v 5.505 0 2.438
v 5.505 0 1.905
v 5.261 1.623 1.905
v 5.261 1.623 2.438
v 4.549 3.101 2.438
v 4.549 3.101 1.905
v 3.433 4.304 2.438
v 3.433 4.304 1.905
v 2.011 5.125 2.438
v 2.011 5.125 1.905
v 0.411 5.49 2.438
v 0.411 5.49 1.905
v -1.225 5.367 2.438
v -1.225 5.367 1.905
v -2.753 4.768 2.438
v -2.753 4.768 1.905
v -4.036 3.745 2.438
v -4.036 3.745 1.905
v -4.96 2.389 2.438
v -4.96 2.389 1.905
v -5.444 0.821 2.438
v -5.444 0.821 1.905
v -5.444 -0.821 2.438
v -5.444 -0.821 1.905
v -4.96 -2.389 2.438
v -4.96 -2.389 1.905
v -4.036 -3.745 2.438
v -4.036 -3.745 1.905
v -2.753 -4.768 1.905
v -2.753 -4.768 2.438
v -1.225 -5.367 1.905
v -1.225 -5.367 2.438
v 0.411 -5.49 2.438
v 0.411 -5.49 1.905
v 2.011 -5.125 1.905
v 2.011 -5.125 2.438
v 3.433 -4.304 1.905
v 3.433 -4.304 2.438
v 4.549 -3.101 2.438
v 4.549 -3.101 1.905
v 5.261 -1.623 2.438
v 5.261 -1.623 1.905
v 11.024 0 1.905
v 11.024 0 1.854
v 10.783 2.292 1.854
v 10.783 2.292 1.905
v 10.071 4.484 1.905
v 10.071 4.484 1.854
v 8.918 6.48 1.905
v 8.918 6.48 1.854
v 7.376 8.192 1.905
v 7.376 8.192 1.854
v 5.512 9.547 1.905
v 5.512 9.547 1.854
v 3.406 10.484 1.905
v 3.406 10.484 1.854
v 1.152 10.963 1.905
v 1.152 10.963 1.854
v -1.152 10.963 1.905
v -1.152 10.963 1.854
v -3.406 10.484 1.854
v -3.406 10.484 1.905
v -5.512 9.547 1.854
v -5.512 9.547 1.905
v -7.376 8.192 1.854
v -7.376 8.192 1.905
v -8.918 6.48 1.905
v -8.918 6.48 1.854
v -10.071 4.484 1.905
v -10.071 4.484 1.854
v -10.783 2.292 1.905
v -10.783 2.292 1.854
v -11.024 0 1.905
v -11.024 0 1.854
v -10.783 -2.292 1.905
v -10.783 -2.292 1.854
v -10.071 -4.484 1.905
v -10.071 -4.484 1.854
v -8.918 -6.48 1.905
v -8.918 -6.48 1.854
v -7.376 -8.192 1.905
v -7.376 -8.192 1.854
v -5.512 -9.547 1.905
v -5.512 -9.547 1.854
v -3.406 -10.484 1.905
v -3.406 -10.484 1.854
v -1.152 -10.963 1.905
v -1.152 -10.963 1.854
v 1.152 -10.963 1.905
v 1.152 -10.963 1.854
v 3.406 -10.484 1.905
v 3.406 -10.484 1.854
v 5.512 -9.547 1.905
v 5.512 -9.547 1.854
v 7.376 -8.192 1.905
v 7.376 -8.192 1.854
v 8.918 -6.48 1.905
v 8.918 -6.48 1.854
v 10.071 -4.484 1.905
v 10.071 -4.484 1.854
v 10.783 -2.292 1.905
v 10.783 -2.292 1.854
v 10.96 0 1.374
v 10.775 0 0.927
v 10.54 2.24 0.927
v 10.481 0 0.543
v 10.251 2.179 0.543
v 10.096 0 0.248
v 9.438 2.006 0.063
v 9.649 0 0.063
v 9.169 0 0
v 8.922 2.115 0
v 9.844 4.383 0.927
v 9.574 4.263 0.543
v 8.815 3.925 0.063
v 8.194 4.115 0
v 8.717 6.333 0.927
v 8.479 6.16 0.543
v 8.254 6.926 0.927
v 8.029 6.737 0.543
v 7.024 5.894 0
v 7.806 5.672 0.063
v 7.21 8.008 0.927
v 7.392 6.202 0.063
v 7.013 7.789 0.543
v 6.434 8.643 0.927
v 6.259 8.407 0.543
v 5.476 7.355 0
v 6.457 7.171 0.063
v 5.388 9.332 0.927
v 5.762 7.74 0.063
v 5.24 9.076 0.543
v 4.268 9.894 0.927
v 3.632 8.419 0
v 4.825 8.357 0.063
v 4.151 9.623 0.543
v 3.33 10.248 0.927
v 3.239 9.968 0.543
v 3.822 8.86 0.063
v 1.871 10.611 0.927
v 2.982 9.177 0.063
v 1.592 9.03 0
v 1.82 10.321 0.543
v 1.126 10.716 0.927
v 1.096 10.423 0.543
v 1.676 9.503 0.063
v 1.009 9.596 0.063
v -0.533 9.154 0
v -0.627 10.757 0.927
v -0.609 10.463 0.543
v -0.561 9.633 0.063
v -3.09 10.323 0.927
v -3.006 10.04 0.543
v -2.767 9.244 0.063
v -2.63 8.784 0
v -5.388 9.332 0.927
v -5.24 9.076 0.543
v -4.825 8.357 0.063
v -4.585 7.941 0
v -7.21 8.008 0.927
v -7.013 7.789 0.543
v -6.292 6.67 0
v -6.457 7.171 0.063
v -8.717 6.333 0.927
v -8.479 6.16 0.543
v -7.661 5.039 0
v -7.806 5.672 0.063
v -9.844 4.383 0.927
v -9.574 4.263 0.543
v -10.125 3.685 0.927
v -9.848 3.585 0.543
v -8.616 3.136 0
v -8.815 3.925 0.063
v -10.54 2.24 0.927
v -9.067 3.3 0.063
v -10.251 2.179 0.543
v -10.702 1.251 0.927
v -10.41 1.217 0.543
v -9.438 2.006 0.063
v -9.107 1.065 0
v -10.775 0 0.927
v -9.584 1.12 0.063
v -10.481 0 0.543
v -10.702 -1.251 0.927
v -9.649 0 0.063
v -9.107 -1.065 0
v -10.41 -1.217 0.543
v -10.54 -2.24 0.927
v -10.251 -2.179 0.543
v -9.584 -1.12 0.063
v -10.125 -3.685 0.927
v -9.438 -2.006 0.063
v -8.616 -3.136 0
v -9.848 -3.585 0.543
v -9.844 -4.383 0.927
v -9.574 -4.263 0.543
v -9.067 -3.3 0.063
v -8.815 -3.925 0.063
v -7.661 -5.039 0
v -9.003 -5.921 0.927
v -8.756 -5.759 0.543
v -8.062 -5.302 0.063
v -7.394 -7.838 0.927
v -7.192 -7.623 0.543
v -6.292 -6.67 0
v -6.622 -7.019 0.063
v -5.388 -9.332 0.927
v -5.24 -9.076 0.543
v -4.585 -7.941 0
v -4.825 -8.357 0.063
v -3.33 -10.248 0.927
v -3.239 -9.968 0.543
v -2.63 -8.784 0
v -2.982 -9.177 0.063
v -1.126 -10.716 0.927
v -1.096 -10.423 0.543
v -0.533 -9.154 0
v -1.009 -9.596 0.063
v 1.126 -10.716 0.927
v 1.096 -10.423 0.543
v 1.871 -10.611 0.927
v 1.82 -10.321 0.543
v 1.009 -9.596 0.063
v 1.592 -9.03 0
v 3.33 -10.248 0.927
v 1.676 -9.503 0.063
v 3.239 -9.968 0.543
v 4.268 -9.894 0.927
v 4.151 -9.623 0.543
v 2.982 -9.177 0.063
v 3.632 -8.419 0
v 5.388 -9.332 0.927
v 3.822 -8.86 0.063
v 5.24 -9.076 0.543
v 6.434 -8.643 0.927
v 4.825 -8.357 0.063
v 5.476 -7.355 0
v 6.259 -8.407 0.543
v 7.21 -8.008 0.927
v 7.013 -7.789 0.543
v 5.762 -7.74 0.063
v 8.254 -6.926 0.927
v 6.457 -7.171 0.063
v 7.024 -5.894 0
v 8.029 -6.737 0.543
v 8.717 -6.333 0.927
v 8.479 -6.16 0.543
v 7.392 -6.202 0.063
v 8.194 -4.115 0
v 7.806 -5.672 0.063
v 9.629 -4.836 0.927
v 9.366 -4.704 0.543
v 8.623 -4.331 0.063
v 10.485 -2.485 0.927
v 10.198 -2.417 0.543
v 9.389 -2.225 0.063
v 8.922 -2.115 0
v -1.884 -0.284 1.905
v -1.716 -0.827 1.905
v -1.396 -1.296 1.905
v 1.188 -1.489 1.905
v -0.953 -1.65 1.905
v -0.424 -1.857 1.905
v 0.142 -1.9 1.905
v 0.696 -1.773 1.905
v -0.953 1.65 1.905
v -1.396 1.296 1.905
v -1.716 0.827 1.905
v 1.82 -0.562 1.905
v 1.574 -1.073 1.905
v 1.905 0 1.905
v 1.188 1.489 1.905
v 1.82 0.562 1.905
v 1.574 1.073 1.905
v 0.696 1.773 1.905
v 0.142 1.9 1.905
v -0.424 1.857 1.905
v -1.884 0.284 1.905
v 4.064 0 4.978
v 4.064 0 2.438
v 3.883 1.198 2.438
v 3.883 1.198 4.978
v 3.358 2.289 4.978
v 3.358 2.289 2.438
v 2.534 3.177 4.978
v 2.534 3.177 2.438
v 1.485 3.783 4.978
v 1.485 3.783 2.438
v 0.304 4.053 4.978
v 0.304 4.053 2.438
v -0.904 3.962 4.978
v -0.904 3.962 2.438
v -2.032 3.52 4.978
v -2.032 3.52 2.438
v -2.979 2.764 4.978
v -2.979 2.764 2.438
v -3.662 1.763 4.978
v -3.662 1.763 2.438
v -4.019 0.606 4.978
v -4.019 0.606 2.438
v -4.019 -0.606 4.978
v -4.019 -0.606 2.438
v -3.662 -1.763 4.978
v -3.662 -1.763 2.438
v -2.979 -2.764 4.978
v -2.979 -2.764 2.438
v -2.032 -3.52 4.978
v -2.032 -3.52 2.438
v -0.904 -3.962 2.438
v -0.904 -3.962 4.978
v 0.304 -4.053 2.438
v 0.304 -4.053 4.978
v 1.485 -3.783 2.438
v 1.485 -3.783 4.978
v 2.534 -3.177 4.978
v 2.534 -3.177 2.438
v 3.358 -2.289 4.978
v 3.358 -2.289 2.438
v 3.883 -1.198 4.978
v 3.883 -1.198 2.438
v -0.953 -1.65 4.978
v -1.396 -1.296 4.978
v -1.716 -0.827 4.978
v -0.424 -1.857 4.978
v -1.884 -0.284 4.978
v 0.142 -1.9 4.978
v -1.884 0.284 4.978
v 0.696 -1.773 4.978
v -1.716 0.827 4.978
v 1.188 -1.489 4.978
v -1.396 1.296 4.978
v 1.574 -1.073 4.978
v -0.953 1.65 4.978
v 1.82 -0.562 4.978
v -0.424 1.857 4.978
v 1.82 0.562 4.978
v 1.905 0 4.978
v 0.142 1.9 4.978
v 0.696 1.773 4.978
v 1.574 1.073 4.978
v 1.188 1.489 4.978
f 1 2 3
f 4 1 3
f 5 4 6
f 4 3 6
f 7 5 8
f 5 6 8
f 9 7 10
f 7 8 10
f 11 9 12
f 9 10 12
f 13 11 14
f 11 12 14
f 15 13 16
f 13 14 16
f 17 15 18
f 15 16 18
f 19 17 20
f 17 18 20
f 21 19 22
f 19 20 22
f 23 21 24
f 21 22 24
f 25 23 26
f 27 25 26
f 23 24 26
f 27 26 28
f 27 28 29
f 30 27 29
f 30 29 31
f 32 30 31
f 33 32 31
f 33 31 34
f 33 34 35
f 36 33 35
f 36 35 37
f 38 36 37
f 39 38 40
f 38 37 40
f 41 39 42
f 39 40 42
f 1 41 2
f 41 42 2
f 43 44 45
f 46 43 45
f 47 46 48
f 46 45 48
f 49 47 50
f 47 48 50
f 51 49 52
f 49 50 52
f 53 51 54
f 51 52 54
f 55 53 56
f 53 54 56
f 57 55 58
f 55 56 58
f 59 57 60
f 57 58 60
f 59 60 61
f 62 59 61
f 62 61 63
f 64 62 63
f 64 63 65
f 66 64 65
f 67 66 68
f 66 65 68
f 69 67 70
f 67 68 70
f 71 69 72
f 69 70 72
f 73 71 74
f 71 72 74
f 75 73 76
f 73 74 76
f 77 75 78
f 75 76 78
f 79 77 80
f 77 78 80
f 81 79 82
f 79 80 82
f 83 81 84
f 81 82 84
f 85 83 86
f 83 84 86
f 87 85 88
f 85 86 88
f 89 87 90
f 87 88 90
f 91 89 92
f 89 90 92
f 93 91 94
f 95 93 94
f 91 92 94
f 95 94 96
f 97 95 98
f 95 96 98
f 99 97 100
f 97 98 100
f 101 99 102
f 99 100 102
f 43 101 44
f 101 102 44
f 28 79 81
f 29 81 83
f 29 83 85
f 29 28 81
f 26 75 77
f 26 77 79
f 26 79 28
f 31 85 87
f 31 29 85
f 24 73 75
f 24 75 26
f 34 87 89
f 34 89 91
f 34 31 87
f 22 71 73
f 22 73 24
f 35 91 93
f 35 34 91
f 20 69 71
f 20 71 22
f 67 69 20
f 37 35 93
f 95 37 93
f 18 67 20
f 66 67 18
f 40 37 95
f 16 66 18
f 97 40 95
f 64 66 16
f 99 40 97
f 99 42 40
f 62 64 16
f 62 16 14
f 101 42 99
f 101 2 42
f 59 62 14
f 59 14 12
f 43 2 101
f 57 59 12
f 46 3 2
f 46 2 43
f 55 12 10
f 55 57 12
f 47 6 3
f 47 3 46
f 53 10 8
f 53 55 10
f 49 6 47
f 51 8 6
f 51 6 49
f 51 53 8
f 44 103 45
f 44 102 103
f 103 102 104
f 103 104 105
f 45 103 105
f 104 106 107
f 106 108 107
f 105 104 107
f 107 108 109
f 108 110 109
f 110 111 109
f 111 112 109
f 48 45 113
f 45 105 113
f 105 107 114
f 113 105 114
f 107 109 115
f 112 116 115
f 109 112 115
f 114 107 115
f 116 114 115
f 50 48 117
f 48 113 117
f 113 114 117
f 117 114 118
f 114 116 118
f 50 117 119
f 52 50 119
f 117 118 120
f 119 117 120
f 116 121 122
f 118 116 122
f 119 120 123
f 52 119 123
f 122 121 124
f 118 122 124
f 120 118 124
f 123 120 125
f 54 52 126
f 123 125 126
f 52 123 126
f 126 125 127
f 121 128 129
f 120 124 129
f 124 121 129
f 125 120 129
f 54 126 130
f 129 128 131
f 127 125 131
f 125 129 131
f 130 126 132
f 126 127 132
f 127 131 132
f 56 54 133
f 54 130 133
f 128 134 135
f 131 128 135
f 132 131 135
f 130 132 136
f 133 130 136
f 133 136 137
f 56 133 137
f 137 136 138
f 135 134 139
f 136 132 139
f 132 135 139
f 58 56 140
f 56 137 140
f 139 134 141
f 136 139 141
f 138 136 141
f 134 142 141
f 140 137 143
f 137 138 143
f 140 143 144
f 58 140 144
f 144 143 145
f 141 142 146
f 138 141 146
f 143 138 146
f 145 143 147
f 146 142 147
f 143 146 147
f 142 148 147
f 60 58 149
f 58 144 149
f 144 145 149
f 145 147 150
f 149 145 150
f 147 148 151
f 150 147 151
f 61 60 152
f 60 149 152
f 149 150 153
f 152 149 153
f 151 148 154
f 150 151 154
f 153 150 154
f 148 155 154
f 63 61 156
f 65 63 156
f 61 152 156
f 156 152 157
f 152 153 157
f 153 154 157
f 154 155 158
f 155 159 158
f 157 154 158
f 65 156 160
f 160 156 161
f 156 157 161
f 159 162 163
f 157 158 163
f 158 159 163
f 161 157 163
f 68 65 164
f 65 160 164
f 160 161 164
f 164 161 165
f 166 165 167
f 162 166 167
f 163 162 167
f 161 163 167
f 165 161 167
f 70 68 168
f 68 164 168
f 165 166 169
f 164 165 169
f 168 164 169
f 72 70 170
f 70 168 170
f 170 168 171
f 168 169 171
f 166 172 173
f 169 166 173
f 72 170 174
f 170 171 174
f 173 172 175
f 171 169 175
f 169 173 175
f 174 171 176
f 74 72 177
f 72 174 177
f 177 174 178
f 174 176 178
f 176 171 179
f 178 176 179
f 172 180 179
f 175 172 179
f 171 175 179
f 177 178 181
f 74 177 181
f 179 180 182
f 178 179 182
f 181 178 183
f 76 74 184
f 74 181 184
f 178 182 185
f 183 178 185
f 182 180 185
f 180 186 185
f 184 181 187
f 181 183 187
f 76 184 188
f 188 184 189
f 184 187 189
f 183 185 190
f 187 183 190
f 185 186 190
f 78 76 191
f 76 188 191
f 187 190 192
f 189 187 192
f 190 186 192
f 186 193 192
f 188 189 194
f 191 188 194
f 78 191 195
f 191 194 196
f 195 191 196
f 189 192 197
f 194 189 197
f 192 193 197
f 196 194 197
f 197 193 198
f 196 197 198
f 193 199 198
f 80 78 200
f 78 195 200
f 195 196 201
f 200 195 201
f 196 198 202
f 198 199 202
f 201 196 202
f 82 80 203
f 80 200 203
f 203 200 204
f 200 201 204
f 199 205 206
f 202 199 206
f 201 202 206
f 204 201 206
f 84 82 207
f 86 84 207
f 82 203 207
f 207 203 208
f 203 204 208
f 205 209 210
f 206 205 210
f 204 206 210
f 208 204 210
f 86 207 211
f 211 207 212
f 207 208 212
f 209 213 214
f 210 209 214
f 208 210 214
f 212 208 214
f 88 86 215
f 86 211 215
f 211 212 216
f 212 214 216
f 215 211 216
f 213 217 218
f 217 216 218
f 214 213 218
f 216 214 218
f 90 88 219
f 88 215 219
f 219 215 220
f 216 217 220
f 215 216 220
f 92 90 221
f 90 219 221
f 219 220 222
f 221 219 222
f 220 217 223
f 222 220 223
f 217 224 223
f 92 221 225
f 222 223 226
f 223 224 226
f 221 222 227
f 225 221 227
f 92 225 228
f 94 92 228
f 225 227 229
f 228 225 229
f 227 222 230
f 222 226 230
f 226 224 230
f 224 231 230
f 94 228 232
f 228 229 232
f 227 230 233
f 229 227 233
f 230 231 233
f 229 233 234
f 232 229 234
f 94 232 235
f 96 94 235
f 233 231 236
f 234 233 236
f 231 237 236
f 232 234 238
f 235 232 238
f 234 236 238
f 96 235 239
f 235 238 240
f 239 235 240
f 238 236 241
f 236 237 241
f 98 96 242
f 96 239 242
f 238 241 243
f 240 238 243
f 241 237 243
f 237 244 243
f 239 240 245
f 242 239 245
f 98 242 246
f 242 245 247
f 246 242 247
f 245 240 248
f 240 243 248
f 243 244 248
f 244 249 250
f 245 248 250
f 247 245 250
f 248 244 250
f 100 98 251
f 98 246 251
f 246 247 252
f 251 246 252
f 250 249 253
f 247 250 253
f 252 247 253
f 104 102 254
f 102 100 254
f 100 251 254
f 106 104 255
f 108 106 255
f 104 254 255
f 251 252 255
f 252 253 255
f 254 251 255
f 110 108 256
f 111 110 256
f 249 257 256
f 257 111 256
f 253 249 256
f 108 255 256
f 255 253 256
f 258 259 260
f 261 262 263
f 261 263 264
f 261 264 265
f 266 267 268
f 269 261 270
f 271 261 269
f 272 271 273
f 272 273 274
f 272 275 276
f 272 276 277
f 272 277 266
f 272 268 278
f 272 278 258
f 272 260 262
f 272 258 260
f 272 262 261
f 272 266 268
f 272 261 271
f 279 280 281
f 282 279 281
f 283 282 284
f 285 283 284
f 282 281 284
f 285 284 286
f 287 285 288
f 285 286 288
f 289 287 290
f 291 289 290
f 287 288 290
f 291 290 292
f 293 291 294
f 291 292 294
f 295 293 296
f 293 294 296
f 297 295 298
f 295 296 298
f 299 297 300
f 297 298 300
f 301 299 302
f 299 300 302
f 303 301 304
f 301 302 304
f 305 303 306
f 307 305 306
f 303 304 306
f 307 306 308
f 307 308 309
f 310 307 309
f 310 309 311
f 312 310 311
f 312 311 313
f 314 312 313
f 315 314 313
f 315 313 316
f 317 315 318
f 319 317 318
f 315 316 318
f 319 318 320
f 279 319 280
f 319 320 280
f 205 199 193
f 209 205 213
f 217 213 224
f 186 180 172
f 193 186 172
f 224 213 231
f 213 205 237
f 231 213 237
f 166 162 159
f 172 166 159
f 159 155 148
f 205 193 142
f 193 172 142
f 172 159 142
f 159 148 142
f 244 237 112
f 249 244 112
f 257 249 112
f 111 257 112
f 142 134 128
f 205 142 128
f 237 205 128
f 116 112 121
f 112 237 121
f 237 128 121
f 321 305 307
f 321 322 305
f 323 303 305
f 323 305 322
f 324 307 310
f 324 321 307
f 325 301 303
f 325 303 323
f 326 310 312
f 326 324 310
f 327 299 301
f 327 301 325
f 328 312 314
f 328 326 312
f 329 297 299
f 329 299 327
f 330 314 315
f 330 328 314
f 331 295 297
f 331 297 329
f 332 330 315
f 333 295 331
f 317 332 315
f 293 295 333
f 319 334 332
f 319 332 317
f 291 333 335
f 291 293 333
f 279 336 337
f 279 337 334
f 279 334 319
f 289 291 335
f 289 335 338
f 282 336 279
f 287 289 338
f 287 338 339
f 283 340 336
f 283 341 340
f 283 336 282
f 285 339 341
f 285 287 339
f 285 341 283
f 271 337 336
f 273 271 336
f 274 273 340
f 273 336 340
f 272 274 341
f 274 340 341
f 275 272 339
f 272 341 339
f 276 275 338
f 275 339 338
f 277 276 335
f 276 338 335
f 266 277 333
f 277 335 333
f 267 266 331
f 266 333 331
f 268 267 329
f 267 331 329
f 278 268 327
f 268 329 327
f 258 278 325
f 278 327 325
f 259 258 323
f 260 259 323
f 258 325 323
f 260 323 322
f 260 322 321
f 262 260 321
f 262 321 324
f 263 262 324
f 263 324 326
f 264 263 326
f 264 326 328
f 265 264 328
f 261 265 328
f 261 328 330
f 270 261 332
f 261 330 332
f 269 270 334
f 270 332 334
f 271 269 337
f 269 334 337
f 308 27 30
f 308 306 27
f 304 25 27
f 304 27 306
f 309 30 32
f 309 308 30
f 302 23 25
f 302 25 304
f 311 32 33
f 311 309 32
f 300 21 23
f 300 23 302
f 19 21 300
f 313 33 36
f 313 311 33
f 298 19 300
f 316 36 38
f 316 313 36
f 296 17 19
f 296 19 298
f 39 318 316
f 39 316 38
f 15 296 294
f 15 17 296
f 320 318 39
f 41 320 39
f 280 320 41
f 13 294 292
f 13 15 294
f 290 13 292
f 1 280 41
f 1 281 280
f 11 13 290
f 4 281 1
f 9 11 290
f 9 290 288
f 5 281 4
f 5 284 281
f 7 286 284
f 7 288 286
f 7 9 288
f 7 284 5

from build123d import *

# Parameters (mm, degrees)
F0_R     = 11.0236
F1_DEPTH = 1.905
F2_R     = 5.50545
F3_DEPTH = 0.5334
F4_R     = 4.064
F5_DEPTH = 2.54
F6_R     = 1.905
F7_DEPTH = 3.0734
F8_R     = 1.8542


with BuildPart() as f1:
    # F0 (on Top) → F1 (new body)
    with BuildSketch(Plane.XY):
        Circle(F0_R)
    extrude(amount=F1_DEPTH)

    # F2 (on face) → F3 (join)
    with BuildSketch(Plane.XY.offset(1.905)):
        Circle(F2_R)
    extrude(amount=F3_DEPTH)

    # F4 (on face) → F5 (join)
    with BuildSketch(Plane.XY.offset(2.4384)):
        Circle(F4_R)
    extrude(amount=F5_DEPTH)

    # F6 (on face) → F7 (cut, through all)
    with BuildSketch(Plane.XY.offset(4.9784)):
        Circle(F6_R)
    extrude(amount=-F7_DEPTH, mode=Mode.SUBTRACT)

    # F8
    f8_edges = [f1.edges().sort_by_distance(p)[0] for p in [
        (-11.0236, 0, 0),
    ]]
    fillet(f8_edges, radius=F8_R)


solid = f1.part
